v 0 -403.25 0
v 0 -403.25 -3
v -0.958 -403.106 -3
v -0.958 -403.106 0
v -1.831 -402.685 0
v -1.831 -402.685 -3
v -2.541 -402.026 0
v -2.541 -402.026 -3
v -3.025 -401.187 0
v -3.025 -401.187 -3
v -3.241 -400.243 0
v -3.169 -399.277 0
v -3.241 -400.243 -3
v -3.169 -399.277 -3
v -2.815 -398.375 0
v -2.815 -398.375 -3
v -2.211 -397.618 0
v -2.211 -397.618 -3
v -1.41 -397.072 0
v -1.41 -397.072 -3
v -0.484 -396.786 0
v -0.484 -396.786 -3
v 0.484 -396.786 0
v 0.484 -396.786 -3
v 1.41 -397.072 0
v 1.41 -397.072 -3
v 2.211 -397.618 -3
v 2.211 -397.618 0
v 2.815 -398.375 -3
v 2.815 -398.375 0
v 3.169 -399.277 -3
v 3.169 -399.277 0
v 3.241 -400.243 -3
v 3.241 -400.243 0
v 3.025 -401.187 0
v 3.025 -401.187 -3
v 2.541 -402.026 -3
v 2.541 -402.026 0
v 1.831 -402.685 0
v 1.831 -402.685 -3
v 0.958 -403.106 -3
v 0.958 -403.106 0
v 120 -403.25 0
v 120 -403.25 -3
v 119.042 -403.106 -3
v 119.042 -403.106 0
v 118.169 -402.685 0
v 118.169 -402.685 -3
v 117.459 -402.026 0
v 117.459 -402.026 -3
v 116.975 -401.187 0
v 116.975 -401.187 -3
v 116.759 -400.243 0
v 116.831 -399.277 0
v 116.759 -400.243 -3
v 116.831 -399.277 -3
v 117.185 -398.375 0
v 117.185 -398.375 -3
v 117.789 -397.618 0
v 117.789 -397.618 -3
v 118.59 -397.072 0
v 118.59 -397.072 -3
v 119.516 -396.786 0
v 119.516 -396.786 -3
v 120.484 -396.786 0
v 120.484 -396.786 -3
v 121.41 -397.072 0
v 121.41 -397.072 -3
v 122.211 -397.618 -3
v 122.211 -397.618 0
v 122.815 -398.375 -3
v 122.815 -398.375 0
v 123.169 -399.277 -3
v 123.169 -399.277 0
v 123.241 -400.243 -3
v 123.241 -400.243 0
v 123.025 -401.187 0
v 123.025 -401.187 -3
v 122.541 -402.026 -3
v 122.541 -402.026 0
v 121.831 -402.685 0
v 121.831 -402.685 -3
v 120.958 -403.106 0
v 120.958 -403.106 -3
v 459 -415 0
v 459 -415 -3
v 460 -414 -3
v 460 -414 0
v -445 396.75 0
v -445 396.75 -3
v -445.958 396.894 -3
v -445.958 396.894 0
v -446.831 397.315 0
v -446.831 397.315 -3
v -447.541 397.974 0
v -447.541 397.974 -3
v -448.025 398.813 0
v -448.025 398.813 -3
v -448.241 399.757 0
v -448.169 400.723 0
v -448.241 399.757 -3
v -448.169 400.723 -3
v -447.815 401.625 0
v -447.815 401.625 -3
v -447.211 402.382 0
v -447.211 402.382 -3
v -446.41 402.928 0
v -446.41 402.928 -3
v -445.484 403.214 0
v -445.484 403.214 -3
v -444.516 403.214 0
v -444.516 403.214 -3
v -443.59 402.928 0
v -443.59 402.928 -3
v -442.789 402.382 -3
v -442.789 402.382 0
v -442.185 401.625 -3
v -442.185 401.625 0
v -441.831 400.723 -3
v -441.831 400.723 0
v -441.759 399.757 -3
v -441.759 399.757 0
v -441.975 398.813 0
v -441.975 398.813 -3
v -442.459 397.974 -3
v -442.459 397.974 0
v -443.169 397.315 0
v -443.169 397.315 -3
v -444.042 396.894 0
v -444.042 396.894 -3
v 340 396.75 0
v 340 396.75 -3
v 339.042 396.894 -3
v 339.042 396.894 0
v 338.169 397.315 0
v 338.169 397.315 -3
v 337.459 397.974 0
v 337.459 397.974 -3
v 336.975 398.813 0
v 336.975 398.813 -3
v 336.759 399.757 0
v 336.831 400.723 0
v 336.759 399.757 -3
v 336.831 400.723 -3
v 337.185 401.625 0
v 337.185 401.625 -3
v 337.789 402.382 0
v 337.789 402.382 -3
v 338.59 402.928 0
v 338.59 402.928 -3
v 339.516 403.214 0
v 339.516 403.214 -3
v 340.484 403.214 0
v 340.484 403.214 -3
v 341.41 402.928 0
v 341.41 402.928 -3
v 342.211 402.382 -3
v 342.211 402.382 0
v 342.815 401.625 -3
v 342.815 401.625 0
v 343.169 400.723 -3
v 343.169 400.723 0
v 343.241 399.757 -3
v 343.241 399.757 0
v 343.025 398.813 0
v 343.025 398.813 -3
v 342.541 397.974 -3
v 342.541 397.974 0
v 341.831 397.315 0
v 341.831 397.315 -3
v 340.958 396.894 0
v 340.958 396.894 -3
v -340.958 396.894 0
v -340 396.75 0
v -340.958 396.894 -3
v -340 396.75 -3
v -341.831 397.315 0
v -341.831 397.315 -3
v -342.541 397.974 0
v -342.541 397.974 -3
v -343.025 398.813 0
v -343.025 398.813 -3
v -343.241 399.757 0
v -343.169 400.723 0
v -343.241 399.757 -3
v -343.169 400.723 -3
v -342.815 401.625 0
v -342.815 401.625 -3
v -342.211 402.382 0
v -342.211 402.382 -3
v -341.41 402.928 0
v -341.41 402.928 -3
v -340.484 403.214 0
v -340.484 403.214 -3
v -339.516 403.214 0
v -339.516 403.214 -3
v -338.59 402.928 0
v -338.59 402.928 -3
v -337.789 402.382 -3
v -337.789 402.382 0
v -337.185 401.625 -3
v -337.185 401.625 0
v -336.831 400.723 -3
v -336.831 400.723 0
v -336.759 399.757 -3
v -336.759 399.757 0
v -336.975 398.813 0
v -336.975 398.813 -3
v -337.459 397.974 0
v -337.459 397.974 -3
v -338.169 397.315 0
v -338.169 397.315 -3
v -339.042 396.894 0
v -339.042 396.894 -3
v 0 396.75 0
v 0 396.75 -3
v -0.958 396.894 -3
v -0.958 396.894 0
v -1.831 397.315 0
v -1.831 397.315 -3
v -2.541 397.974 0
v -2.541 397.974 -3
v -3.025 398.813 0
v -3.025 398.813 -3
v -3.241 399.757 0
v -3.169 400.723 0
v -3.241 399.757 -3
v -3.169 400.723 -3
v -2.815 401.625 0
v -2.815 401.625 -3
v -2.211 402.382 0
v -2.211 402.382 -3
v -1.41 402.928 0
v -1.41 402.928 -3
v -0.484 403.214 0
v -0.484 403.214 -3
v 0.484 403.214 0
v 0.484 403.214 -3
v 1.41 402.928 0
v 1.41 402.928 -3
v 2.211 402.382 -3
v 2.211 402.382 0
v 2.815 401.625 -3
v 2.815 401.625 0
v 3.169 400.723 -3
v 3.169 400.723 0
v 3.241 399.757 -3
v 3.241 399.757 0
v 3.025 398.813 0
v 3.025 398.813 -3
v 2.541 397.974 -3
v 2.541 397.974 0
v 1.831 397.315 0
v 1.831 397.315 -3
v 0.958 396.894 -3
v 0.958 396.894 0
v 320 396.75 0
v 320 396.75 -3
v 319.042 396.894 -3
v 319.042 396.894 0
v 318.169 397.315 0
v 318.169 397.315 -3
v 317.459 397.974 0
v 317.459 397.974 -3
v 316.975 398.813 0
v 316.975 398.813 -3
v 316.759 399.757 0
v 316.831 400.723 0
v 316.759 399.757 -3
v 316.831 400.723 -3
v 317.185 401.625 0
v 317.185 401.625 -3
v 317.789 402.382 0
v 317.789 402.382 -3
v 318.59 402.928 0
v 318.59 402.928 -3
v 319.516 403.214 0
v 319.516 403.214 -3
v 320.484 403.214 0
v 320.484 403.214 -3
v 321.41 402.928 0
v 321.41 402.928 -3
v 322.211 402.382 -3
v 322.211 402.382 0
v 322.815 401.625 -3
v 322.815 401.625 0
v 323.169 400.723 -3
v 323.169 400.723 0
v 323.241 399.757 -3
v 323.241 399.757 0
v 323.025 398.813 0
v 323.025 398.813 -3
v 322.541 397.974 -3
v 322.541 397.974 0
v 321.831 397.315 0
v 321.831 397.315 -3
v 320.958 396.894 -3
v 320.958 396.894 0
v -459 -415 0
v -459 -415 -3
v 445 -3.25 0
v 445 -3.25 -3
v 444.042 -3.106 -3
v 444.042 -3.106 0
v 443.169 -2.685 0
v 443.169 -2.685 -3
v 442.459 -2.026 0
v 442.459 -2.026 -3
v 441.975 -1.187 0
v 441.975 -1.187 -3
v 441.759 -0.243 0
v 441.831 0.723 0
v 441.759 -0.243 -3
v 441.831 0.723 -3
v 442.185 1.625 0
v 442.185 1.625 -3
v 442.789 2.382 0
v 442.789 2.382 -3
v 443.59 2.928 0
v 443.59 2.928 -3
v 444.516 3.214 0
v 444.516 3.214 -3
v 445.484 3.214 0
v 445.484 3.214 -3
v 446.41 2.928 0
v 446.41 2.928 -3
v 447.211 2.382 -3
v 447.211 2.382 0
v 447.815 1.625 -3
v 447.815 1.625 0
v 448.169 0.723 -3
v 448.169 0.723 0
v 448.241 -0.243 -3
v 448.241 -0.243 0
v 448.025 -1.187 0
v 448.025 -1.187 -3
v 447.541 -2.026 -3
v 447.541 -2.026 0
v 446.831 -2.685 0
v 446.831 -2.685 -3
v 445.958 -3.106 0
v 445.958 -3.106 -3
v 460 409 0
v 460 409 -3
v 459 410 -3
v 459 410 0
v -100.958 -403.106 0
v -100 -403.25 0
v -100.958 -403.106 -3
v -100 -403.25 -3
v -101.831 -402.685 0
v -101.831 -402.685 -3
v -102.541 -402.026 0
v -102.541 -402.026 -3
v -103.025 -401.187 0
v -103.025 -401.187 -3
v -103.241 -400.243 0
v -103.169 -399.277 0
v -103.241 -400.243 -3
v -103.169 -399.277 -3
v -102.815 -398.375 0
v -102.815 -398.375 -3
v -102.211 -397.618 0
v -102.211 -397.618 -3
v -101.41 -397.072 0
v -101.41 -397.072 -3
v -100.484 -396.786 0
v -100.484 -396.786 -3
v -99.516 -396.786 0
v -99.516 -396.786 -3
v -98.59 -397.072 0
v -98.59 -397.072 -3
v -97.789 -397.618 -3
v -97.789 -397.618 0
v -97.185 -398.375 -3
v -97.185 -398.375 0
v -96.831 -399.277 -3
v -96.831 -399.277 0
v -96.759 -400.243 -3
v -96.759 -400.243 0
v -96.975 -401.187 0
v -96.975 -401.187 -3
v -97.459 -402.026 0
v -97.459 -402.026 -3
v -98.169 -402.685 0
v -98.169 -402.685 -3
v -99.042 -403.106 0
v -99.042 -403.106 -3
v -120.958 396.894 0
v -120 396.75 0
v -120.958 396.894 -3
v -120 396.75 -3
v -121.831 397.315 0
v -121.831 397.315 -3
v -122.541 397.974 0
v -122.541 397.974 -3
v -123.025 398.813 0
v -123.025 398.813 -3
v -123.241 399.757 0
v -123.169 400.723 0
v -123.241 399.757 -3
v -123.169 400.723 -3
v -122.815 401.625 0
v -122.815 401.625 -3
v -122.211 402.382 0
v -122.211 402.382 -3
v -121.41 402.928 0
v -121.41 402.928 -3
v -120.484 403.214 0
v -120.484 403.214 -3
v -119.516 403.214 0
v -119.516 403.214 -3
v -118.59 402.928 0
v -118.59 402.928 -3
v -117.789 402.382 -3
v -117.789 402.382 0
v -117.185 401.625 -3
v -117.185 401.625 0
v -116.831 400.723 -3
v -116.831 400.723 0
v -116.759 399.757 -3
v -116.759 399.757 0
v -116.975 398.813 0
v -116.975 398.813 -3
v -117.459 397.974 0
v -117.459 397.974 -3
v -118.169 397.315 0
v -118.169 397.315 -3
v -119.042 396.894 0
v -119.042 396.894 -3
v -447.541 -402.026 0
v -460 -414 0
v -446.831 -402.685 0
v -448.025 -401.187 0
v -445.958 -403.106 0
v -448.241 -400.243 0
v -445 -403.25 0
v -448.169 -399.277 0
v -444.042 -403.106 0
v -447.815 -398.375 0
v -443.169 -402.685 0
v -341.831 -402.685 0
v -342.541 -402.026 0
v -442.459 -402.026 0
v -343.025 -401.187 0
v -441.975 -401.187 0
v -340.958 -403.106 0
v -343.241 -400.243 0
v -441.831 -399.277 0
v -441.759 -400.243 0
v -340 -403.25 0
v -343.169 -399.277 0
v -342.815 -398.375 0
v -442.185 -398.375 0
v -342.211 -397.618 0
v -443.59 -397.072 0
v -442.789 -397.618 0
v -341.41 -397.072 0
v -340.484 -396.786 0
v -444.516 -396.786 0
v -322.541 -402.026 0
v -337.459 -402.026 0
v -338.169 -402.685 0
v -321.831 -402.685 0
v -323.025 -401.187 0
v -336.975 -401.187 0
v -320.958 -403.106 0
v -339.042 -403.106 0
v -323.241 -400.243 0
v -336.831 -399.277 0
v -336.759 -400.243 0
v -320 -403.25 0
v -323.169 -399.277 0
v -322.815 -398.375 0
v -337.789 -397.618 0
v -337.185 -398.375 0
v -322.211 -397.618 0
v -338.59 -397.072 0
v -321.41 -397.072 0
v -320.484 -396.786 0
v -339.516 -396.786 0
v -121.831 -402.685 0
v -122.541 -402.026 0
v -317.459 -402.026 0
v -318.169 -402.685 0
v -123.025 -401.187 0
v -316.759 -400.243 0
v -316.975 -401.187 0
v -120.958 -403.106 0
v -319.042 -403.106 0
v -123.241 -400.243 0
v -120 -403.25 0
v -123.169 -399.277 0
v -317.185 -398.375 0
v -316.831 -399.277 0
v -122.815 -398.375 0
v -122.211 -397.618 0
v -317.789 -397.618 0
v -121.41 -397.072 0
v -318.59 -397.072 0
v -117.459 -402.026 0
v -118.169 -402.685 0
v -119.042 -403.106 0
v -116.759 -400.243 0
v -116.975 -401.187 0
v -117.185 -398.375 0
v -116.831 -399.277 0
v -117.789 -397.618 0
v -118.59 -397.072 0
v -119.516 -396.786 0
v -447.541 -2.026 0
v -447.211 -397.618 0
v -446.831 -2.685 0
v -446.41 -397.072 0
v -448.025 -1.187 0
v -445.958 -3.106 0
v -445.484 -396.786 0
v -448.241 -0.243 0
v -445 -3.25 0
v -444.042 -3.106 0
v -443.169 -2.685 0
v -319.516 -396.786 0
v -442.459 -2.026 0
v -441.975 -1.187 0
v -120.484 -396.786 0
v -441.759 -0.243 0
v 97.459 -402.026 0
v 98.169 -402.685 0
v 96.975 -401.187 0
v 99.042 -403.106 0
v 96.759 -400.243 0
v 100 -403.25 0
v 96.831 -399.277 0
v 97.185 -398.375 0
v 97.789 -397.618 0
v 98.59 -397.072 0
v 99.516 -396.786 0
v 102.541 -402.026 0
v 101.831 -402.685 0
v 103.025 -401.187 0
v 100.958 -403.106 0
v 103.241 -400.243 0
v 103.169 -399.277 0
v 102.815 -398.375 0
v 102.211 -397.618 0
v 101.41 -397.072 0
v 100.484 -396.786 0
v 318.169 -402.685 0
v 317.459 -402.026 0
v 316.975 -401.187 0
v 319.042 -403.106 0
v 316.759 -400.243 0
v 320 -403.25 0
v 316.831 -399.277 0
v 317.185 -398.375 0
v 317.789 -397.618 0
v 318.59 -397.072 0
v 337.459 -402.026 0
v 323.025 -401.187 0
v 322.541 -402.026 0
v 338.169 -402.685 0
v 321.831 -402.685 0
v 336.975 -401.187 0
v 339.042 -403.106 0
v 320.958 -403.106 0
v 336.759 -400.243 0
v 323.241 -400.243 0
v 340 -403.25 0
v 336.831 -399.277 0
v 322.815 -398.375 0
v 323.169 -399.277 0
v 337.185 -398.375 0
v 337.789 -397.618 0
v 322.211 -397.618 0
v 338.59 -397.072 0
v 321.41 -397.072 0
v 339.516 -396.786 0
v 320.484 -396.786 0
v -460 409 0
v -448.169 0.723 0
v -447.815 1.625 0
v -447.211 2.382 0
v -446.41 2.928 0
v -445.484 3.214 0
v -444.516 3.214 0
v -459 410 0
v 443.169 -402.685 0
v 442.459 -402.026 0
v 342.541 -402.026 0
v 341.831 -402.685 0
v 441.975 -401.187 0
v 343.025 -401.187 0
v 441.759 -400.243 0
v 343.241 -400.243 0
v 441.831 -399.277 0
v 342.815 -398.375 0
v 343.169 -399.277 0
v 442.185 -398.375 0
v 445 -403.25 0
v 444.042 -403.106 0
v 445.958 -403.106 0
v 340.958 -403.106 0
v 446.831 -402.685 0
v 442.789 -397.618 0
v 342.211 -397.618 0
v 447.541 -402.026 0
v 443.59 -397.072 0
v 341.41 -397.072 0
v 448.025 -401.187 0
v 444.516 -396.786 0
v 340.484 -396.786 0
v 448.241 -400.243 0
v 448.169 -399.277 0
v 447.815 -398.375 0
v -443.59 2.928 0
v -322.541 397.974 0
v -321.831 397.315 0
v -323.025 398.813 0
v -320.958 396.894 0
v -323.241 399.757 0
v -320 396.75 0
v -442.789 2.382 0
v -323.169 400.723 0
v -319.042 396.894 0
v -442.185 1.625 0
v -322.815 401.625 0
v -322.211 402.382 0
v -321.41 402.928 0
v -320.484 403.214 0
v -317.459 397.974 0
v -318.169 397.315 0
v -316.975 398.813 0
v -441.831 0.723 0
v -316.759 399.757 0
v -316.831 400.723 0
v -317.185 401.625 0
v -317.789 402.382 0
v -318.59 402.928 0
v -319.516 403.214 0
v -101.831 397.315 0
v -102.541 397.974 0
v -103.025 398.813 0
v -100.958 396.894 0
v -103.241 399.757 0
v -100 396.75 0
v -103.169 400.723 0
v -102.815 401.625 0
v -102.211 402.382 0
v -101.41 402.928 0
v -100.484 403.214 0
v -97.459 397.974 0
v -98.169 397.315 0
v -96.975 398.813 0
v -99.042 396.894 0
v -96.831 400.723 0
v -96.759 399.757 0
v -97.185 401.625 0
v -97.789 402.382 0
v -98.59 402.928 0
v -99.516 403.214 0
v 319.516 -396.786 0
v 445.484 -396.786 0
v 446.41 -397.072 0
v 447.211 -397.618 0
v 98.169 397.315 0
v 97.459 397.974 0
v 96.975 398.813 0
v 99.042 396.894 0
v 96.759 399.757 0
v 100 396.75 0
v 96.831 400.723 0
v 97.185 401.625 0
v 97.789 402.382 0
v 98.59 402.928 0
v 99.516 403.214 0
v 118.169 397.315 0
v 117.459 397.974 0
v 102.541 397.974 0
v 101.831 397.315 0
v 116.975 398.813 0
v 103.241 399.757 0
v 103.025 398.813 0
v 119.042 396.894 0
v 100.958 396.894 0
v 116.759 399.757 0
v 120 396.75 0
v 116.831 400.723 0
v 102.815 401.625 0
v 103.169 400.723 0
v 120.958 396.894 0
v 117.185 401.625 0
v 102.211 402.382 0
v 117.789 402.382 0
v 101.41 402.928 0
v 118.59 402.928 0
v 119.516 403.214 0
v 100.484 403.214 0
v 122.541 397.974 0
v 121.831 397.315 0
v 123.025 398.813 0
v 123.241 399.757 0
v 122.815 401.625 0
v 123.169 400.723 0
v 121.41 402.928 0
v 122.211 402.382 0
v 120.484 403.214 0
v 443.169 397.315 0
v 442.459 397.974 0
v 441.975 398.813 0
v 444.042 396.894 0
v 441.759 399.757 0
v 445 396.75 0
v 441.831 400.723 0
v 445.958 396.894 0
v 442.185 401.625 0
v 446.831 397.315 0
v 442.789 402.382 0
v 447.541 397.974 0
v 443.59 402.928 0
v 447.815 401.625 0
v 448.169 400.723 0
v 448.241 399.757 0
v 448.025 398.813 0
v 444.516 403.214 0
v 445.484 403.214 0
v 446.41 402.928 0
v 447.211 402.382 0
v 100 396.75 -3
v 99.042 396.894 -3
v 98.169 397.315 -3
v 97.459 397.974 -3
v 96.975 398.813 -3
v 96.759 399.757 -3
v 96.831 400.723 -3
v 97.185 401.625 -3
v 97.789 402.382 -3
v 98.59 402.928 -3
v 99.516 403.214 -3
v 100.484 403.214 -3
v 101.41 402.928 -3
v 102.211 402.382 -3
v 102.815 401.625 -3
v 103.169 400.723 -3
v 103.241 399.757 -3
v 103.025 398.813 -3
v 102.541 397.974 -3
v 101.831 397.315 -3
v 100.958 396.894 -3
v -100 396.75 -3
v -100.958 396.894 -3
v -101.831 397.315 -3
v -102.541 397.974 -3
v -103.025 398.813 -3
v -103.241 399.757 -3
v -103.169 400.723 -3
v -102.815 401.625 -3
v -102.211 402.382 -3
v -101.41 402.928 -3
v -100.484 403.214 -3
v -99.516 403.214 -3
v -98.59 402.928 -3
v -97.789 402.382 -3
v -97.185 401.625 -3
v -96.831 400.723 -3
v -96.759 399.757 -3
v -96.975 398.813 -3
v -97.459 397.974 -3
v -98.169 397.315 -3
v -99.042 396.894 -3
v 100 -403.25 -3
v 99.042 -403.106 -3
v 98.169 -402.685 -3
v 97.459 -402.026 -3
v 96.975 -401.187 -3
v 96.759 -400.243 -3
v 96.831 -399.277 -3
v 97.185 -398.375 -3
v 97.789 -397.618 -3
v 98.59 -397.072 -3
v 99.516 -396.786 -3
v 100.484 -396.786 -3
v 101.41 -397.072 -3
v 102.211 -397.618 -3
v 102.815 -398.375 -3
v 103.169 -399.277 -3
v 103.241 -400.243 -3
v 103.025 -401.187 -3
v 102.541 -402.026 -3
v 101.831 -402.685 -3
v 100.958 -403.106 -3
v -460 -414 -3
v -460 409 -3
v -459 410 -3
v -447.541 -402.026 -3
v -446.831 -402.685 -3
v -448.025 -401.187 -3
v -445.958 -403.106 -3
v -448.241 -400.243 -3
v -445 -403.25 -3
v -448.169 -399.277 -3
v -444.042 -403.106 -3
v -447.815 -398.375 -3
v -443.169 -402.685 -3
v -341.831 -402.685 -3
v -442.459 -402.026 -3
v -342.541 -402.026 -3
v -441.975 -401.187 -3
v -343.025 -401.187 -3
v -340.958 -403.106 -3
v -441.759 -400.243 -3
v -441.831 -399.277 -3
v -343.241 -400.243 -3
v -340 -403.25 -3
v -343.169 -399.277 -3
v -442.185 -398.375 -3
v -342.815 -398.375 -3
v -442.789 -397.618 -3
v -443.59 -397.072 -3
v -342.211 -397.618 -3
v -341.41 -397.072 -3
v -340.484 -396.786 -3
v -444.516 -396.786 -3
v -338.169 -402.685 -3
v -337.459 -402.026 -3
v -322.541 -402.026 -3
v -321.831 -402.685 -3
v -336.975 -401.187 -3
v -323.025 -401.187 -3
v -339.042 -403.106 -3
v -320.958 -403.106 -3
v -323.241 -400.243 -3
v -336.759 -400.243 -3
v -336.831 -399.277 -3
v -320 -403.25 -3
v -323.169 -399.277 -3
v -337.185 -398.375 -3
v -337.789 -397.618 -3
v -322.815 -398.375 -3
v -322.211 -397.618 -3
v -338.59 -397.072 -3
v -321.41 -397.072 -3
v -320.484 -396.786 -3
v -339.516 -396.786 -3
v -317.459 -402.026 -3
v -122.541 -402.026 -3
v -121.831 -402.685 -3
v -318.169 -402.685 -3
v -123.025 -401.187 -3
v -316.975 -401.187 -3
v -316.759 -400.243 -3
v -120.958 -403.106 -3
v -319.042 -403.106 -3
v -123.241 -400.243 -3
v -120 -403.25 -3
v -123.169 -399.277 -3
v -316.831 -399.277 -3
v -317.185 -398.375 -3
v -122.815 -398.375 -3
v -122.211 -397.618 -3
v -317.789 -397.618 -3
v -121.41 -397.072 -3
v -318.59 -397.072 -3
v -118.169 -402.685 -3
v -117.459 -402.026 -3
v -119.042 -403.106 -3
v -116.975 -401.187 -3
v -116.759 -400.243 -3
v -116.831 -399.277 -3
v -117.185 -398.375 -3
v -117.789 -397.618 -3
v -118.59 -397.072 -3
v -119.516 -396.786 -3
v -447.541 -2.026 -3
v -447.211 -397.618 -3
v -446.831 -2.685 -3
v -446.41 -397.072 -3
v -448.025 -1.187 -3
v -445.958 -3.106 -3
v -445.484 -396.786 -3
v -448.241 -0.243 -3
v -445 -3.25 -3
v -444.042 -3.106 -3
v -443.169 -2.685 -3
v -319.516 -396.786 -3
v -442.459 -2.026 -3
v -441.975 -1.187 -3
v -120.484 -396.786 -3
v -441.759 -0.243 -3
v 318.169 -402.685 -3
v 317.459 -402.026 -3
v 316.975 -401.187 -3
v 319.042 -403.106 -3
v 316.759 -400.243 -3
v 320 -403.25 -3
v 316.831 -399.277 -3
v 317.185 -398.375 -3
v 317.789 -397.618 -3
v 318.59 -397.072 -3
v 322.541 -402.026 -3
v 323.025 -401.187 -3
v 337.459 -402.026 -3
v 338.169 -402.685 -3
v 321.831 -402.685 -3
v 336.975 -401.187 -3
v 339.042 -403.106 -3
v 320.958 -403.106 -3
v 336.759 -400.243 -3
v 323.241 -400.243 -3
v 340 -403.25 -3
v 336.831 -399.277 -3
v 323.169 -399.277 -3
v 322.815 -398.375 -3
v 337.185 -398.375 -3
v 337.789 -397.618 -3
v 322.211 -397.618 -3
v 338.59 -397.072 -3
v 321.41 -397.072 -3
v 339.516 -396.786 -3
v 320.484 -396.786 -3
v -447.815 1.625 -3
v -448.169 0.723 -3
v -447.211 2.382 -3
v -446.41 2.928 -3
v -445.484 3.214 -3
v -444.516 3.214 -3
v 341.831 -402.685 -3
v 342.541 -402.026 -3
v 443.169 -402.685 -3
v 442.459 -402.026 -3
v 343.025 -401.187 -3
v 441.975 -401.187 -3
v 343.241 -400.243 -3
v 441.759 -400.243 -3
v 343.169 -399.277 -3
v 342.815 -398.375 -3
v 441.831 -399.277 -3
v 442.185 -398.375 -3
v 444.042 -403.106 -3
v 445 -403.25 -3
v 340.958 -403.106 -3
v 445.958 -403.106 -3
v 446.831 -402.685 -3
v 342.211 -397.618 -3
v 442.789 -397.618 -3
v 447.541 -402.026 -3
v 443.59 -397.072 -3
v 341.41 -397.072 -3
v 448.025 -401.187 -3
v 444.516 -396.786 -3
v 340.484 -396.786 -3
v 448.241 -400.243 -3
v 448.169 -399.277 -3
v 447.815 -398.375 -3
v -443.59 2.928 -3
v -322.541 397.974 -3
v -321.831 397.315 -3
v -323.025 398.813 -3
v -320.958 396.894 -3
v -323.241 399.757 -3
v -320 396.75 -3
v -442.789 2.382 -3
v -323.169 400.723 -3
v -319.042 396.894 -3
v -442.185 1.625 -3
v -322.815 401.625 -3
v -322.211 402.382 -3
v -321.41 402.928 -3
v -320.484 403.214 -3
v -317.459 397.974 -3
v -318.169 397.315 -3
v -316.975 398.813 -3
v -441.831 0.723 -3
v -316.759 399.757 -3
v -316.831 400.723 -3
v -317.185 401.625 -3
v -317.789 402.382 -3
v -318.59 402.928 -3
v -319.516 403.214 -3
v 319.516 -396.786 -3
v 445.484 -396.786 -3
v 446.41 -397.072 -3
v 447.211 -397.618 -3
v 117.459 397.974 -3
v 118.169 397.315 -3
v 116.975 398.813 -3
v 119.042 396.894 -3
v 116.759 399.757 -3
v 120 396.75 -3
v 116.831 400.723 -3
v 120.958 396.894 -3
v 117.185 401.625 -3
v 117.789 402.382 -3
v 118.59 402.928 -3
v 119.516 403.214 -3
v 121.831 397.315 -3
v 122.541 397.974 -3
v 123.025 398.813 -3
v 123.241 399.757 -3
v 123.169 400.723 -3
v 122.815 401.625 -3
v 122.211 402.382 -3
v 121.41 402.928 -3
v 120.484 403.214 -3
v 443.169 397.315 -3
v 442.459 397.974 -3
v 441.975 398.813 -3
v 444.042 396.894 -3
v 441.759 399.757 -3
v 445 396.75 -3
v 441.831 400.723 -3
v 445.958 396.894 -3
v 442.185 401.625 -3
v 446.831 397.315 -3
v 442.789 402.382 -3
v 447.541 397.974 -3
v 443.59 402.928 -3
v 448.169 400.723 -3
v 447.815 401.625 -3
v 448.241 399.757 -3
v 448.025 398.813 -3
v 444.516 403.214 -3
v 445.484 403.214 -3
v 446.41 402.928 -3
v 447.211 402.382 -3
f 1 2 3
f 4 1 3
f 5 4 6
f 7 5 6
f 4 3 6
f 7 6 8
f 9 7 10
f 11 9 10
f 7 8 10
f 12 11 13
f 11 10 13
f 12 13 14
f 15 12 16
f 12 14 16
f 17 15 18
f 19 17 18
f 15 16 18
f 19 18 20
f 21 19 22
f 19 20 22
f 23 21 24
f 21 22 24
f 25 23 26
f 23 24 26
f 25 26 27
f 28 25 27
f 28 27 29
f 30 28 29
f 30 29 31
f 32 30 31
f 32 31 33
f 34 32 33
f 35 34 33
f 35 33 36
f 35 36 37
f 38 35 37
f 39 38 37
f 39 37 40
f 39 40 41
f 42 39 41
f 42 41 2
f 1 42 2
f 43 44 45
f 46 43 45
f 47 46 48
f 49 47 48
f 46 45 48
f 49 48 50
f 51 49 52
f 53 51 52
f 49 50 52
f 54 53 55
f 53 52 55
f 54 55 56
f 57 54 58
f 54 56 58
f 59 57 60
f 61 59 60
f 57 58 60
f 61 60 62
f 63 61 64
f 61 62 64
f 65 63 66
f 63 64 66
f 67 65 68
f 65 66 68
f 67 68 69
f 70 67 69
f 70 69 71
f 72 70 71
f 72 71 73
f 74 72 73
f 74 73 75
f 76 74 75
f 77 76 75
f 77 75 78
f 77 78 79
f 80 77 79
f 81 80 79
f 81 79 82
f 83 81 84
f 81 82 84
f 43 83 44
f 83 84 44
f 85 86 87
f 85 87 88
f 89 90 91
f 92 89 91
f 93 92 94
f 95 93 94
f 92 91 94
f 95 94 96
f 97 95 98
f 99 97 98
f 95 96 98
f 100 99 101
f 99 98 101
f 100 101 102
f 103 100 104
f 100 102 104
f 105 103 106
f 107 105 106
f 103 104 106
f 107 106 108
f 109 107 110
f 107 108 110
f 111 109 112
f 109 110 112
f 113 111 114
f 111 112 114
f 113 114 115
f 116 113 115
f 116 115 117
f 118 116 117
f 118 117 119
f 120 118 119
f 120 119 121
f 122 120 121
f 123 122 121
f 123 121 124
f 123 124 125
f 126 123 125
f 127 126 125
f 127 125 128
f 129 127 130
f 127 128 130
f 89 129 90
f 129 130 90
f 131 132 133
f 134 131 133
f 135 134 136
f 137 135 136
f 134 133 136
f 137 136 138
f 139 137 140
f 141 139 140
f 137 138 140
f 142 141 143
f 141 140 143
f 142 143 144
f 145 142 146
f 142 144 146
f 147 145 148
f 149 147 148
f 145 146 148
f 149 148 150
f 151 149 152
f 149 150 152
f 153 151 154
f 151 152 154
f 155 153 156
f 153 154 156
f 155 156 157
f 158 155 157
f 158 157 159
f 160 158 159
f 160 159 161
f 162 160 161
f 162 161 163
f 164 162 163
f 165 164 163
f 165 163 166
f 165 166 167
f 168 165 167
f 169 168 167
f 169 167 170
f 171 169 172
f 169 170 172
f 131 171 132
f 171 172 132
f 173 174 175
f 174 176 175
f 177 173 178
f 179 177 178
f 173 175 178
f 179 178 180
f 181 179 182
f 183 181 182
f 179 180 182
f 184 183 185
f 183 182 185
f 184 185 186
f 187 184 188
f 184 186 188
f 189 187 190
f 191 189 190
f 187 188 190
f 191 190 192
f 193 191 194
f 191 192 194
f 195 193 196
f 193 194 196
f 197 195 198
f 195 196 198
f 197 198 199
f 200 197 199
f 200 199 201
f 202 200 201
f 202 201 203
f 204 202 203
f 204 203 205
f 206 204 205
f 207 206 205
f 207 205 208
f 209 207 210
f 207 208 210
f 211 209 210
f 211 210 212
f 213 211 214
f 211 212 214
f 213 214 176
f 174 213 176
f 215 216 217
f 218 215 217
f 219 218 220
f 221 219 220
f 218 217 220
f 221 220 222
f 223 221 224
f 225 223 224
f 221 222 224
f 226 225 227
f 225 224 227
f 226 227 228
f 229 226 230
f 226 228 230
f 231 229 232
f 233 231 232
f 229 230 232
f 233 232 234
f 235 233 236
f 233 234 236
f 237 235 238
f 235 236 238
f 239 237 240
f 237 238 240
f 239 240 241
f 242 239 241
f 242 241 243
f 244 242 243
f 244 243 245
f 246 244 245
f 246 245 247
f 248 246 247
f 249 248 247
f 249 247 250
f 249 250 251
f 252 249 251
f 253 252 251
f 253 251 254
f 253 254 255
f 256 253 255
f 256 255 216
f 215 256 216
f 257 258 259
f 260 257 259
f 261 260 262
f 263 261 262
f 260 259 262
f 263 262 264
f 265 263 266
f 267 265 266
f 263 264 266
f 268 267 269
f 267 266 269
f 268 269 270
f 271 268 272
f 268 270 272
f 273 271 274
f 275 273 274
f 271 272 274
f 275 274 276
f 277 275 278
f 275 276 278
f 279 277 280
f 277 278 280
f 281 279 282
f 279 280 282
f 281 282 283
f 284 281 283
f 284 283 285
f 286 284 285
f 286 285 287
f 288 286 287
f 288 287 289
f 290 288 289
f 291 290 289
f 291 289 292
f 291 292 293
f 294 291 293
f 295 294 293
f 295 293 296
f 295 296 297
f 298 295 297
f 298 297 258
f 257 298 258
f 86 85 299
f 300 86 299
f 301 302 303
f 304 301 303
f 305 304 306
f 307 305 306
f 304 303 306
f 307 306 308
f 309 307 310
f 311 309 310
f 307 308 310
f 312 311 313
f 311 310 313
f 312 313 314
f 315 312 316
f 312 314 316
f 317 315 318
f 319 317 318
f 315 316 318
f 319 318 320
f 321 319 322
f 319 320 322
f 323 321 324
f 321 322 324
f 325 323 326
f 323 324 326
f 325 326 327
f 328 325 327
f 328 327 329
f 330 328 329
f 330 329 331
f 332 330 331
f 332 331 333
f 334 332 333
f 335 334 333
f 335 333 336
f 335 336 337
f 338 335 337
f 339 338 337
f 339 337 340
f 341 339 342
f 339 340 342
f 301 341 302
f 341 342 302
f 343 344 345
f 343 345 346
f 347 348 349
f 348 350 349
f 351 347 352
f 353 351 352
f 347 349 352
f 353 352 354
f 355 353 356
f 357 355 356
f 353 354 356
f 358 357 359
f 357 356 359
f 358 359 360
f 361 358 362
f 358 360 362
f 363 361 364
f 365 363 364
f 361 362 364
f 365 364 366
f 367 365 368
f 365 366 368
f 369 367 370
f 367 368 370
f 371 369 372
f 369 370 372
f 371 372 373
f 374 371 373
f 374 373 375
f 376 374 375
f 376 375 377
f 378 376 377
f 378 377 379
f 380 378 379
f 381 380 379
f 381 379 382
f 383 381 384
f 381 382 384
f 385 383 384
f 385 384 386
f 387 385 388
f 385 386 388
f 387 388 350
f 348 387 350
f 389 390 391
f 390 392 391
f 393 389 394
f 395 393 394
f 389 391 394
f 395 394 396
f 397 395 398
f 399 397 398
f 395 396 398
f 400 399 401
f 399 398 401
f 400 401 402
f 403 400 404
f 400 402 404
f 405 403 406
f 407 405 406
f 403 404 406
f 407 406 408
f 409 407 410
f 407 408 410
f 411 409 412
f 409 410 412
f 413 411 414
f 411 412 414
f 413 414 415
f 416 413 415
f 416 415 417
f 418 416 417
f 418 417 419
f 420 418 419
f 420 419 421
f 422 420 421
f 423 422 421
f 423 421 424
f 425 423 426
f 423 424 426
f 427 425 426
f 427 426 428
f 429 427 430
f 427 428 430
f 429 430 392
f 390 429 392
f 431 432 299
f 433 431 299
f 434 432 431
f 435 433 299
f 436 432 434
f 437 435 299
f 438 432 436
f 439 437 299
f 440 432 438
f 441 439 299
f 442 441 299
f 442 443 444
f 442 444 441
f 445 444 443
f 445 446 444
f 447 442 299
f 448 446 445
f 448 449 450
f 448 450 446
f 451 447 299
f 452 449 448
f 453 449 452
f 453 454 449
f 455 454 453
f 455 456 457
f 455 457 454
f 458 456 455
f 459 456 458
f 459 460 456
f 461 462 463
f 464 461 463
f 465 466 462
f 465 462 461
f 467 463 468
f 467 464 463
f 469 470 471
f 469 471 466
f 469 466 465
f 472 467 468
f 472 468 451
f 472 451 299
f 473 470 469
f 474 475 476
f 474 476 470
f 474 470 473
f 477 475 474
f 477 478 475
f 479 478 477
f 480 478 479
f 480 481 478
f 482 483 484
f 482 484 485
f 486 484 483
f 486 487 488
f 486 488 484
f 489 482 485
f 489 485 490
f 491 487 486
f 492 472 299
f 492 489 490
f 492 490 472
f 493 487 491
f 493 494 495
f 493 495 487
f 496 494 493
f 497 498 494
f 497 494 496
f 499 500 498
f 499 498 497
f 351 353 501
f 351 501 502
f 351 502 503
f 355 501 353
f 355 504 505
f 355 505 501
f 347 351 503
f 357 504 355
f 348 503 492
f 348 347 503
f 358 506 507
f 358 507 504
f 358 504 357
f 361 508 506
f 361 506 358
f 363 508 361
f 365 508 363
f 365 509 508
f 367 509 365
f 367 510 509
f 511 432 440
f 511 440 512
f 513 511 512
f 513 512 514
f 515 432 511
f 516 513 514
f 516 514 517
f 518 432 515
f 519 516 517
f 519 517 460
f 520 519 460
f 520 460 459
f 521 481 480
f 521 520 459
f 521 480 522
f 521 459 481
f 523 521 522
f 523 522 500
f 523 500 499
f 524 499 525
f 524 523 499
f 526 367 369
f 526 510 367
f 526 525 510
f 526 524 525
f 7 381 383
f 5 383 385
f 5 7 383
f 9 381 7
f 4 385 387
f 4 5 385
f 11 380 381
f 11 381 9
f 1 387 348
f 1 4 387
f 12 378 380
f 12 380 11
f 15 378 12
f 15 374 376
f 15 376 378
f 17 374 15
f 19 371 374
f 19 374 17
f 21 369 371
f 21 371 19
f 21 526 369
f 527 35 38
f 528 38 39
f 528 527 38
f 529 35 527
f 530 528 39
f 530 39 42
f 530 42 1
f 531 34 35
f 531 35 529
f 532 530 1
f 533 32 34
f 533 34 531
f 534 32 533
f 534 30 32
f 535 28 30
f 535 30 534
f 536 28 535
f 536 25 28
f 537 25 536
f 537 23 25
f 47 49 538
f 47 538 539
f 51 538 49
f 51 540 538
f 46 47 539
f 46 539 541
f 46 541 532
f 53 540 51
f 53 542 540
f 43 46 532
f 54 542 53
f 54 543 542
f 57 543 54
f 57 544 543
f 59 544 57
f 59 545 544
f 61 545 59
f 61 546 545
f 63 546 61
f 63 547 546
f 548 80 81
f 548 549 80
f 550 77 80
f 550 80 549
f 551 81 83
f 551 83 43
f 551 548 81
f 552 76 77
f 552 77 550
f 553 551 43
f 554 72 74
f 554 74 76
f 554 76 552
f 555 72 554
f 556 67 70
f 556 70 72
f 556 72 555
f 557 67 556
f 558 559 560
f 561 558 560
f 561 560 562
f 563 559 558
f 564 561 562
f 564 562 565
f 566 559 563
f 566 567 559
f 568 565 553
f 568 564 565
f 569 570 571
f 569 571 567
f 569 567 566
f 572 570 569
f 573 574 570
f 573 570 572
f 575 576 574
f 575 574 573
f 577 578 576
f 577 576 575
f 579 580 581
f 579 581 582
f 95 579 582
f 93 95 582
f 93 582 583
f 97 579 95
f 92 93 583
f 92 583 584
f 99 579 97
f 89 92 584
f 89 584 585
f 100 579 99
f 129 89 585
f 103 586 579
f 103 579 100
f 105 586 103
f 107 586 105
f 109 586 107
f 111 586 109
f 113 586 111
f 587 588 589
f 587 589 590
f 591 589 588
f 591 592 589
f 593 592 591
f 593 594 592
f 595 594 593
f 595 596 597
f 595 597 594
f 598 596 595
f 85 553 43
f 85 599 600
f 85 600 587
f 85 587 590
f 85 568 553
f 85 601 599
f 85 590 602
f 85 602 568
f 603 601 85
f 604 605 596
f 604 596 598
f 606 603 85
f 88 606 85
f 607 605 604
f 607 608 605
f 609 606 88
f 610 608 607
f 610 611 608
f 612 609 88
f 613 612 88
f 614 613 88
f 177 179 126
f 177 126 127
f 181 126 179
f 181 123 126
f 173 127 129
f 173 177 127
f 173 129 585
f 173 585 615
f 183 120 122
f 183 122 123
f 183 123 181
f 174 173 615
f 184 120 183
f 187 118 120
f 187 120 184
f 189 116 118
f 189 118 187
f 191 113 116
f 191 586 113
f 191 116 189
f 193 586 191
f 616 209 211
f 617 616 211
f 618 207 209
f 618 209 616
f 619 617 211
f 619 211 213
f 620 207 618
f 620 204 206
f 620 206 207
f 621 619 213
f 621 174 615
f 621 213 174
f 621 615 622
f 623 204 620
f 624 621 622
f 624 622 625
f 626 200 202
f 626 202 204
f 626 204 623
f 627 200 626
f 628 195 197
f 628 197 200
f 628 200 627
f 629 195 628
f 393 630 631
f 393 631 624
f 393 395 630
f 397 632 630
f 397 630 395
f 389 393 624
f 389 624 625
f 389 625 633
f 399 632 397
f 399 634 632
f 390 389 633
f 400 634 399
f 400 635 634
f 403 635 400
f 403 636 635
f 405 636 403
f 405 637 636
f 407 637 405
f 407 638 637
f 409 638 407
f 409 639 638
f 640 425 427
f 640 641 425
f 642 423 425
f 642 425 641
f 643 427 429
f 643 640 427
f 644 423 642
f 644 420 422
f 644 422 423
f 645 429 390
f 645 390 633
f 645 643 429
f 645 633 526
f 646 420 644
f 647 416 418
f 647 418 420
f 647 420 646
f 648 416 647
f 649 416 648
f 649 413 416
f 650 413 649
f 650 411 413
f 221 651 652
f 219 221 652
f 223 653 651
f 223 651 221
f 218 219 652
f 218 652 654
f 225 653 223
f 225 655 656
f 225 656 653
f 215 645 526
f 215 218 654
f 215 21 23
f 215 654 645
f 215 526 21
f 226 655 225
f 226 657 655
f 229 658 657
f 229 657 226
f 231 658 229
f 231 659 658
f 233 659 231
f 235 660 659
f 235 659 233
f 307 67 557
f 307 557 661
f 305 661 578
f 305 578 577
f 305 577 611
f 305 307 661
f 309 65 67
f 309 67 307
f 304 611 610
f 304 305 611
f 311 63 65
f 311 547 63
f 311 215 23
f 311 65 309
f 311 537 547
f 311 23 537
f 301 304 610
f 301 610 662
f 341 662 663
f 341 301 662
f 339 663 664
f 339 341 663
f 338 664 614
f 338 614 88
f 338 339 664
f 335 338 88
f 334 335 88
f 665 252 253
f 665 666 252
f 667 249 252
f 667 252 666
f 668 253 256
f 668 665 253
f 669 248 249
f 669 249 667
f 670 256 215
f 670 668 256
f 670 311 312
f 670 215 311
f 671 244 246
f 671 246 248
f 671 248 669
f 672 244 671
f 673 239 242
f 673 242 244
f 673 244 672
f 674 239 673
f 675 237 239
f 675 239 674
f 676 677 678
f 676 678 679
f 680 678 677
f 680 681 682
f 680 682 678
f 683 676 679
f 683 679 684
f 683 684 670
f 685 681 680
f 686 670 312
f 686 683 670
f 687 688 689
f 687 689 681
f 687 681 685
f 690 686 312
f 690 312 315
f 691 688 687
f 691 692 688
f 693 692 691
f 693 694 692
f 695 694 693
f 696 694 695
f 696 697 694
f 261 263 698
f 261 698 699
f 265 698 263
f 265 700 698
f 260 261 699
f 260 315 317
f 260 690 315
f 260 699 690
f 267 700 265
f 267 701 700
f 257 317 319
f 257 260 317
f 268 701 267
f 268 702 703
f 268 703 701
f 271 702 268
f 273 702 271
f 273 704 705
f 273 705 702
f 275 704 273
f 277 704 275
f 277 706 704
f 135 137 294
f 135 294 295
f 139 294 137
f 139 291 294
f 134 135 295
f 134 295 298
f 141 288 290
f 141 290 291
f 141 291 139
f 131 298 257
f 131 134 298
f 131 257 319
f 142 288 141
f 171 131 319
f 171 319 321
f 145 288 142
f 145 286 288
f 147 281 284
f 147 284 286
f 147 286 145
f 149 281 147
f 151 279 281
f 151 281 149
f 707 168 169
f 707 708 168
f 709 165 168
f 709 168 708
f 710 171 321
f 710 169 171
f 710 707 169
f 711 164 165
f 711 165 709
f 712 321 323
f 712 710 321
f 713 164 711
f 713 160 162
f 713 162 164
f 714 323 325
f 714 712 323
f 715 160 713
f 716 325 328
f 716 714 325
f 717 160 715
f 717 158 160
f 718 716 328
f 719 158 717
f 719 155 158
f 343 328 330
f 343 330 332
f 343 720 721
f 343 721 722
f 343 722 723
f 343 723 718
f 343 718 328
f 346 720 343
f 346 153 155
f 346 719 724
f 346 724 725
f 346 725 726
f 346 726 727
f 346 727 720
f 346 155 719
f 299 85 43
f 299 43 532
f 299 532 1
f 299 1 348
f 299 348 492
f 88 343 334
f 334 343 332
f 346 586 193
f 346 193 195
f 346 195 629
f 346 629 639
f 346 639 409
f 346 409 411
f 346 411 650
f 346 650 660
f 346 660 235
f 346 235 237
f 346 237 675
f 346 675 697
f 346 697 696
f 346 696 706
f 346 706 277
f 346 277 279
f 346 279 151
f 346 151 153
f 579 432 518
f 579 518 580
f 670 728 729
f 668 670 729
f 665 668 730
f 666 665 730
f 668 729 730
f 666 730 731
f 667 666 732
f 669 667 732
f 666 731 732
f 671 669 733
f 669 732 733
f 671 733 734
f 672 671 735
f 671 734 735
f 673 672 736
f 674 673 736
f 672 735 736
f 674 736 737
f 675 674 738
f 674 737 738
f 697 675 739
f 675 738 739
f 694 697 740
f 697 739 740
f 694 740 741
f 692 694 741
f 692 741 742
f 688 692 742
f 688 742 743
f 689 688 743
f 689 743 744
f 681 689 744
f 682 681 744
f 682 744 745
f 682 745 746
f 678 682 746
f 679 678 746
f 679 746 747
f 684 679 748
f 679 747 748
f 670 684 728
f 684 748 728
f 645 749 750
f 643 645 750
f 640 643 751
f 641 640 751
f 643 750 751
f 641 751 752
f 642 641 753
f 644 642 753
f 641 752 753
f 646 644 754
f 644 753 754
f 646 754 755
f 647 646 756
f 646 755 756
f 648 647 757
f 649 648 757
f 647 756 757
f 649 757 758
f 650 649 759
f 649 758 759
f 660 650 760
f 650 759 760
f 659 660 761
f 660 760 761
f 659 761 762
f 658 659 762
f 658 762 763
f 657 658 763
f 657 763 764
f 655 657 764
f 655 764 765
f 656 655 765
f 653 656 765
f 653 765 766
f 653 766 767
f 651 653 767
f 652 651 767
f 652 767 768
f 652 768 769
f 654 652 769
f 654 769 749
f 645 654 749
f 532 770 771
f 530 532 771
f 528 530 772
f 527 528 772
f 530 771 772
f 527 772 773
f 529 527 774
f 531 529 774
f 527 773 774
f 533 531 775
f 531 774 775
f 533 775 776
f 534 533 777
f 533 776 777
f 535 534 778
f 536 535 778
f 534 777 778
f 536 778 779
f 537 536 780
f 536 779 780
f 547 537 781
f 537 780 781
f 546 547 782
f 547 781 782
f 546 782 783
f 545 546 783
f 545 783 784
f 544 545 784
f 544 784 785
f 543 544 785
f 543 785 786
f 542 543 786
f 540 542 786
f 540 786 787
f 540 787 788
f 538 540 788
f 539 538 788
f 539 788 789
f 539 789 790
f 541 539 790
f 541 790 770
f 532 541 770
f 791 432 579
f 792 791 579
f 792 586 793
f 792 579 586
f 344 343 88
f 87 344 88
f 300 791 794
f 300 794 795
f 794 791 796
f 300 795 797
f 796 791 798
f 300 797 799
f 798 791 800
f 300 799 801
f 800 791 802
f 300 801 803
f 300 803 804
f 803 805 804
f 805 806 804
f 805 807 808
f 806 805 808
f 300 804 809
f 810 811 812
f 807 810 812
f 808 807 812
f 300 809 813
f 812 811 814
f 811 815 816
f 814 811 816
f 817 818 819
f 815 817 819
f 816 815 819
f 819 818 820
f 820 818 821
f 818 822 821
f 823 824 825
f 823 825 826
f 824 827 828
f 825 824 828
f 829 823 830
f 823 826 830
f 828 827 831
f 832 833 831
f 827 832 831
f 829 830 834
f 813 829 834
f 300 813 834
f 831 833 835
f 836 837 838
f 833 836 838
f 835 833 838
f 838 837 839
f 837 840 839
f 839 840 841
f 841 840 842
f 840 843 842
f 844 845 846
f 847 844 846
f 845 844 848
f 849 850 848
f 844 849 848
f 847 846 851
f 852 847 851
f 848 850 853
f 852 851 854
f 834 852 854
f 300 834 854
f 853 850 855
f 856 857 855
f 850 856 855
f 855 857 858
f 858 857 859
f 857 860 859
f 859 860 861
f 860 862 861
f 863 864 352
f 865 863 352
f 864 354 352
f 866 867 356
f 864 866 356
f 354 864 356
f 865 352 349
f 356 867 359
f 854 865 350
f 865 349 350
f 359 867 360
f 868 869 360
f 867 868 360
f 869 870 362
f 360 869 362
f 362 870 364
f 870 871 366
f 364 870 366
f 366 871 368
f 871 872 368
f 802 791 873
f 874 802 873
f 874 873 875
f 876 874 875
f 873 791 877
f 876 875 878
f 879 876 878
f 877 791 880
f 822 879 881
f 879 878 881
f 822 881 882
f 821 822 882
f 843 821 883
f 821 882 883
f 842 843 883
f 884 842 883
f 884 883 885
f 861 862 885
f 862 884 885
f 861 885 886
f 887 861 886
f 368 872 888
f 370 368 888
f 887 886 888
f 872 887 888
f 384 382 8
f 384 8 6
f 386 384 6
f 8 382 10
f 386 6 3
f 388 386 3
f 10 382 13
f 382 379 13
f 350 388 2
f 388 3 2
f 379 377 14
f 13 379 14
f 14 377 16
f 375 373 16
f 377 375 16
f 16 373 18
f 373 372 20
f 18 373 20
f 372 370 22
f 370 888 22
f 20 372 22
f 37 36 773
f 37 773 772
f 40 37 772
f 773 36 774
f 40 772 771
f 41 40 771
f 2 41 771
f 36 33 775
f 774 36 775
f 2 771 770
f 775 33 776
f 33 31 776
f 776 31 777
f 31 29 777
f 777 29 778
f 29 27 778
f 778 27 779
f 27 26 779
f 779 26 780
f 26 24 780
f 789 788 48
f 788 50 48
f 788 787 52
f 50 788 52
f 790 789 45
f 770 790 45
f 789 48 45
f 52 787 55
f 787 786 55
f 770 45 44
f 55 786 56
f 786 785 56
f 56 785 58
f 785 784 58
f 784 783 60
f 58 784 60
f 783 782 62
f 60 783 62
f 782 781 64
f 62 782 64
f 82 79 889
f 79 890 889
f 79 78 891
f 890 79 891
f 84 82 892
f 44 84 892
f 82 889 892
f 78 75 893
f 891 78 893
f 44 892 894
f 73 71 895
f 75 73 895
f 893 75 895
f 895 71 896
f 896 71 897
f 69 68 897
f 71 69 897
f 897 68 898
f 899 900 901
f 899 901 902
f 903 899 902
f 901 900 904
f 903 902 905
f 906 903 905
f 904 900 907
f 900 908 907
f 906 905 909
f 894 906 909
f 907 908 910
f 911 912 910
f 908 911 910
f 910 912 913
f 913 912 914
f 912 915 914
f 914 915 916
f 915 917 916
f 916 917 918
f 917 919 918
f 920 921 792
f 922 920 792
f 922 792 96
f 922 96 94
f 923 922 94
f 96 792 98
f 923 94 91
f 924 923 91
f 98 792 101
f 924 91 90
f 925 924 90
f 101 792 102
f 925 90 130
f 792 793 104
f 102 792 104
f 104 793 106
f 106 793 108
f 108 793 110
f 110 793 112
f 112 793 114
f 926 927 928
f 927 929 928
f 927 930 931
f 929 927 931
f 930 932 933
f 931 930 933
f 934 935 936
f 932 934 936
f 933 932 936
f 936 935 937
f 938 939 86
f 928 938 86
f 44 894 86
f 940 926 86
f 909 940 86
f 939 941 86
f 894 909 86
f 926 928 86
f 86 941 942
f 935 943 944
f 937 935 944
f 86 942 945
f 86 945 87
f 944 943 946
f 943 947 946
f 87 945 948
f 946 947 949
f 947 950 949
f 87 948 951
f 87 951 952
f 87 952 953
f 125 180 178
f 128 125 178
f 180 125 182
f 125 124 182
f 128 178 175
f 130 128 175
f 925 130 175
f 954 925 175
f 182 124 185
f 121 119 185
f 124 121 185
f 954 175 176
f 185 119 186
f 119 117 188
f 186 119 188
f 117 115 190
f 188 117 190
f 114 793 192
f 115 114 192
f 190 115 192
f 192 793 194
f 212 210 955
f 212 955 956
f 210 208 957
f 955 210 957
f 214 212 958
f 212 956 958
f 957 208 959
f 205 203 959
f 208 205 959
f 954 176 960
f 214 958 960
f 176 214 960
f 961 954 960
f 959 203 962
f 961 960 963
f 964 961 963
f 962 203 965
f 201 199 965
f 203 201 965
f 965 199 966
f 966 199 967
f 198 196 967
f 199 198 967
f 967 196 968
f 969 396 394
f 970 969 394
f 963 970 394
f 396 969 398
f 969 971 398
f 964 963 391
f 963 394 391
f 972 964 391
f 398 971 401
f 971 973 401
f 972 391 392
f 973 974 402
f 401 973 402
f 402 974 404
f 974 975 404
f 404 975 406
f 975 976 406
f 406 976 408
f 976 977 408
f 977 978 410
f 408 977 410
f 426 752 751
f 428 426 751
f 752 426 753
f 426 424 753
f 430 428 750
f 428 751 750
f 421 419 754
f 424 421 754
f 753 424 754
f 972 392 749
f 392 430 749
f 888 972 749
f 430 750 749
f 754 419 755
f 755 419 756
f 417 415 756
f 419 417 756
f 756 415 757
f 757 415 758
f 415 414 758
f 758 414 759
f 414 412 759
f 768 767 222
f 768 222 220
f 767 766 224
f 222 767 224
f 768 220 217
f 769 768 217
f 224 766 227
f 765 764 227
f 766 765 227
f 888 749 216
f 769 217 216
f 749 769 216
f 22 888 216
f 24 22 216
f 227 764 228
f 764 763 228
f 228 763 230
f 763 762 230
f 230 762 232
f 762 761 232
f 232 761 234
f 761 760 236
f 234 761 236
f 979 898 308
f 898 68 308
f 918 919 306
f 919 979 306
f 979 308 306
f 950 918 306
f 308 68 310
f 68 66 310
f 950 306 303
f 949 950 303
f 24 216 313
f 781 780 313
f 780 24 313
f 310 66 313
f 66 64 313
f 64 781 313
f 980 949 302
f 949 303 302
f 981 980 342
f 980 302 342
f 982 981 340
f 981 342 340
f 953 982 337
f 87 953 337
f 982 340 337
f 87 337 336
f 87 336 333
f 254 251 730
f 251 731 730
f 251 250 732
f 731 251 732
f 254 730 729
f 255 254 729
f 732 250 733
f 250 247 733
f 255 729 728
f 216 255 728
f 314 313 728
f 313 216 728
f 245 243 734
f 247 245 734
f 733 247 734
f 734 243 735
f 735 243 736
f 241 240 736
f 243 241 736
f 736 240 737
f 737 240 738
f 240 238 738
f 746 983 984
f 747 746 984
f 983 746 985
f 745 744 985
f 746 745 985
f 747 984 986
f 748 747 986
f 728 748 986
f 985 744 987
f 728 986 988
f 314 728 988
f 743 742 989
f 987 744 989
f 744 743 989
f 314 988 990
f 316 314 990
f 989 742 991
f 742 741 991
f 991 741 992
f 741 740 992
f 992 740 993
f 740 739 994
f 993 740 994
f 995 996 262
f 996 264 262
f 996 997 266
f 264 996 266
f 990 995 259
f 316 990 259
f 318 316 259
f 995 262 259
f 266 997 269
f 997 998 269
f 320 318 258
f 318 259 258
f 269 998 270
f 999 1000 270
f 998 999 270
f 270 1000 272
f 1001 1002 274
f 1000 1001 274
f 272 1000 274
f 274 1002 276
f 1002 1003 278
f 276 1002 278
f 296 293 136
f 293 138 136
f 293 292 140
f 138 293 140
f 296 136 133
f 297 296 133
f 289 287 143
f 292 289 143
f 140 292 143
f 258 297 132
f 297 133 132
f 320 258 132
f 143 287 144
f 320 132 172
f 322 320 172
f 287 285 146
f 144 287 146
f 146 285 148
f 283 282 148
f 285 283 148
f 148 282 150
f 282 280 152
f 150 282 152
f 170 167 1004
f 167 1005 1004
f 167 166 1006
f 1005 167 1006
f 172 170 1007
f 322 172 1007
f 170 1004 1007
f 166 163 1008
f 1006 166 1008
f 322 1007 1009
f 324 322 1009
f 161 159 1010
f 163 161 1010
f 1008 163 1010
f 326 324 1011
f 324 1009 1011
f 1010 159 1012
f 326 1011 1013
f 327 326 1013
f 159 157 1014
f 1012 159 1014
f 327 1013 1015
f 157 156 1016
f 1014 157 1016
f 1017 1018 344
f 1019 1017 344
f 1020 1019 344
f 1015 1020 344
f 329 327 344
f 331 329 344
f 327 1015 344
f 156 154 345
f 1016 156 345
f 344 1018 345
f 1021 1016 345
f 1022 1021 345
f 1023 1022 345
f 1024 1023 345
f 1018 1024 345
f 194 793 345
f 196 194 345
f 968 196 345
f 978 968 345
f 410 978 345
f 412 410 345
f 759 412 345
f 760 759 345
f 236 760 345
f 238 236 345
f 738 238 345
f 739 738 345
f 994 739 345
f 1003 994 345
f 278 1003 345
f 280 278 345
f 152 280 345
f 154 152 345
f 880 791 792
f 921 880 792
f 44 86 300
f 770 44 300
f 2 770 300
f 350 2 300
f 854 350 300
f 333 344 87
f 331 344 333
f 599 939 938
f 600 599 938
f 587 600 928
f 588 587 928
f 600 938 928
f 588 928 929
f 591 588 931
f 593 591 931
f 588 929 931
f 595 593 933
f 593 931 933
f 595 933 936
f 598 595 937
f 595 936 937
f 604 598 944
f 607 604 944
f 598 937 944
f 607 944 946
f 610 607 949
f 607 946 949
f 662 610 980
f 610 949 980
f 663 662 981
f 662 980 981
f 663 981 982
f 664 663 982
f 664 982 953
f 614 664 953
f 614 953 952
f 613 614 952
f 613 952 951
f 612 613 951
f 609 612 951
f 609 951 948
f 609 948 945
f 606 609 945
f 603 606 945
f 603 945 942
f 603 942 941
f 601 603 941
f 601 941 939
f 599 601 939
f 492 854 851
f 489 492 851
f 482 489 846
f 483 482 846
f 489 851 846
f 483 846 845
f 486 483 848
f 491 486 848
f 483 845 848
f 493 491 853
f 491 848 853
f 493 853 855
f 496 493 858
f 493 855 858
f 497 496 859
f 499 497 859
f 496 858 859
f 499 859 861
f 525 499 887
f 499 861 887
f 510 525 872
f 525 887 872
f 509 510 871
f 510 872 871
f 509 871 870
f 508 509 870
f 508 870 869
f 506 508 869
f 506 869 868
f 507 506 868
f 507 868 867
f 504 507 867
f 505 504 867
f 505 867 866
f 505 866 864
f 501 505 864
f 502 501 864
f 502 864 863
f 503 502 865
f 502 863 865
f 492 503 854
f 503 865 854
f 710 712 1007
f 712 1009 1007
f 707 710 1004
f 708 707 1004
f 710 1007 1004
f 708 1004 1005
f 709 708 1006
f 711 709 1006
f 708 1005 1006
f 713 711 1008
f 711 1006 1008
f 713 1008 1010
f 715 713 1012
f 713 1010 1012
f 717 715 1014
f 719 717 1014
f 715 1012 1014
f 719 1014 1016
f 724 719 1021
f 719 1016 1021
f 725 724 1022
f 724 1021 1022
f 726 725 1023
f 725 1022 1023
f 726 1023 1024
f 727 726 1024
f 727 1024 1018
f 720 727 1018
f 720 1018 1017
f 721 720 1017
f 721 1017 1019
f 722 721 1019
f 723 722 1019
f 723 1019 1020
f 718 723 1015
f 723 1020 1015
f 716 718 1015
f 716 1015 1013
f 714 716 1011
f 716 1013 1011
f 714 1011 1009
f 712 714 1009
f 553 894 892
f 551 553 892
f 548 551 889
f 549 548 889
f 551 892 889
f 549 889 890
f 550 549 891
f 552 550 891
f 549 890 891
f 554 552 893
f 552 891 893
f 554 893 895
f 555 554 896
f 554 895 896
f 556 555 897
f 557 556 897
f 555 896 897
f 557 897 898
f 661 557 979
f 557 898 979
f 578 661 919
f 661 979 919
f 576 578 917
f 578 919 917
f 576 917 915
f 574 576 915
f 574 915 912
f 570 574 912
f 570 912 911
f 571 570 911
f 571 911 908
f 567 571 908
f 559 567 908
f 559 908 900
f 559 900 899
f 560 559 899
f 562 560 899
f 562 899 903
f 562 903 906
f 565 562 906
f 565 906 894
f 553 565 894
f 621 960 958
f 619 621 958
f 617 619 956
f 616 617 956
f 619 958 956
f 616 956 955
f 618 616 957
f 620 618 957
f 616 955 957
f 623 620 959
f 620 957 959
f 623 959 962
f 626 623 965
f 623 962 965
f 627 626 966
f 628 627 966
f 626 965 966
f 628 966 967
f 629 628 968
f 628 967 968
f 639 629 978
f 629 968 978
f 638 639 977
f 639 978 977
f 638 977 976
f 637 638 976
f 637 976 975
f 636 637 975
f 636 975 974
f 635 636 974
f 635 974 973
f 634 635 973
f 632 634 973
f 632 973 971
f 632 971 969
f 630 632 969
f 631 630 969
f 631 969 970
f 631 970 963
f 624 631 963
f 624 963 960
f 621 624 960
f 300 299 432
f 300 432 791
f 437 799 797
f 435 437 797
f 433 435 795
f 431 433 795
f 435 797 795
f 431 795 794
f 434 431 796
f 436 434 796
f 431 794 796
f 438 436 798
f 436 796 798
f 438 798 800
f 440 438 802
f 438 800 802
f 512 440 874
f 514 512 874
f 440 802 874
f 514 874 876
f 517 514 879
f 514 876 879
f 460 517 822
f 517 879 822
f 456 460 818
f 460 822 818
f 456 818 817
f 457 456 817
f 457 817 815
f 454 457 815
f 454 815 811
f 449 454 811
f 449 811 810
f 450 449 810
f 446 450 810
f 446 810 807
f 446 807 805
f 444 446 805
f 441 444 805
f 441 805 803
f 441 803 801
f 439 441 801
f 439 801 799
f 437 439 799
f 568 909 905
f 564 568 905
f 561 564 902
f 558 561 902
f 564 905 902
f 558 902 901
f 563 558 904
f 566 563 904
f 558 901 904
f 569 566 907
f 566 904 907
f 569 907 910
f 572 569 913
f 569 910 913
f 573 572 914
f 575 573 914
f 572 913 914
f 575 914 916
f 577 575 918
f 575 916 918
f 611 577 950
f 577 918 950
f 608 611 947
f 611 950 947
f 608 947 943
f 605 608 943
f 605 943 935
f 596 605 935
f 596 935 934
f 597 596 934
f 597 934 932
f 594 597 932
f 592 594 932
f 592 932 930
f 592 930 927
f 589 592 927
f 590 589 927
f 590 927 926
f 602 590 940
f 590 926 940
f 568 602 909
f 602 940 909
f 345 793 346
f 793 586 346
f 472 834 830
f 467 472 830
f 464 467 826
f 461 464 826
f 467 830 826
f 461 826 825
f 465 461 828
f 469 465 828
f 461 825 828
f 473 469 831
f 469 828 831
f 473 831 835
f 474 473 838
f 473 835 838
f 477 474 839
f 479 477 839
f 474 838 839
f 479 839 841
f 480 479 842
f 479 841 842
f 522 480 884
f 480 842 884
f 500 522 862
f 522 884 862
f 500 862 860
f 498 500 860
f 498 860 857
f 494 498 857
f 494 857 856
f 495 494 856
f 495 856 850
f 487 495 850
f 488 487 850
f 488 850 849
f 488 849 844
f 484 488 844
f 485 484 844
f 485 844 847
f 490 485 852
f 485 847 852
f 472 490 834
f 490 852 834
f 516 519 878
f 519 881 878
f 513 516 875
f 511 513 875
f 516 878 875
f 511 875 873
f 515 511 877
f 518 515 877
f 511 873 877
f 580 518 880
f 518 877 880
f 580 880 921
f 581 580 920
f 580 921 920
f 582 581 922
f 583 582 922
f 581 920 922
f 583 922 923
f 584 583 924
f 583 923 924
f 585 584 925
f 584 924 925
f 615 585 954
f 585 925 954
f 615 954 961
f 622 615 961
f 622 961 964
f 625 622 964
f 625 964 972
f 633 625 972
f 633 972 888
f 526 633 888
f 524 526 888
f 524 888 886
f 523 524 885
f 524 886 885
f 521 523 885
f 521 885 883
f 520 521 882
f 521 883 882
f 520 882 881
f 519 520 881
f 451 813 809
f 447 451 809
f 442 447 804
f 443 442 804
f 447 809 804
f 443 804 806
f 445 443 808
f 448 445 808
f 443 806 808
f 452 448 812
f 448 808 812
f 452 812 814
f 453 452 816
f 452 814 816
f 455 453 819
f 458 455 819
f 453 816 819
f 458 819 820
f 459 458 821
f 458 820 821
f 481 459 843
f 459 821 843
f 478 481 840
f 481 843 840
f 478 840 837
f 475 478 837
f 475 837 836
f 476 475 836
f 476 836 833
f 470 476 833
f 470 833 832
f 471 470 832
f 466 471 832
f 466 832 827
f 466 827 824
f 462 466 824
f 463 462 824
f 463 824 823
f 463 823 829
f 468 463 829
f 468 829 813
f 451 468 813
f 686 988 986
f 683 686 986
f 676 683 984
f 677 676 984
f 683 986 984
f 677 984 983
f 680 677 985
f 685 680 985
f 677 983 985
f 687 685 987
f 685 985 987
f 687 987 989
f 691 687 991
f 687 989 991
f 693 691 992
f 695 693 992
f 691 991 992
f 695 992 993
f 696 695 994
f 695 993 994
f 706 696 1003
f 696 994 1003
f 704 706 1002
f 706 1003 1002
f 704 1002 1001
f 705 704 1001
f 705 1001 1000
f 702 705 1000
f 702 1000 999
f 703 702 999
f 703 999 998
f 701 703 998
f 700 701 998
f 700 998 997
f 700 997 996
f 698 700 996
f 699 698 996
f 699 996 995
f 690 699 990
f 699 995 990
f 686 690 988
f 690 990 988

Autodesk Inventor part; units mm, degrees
ref_plane "YZ Plane" through (0, 0, 0) normal (1, 0, 0) x (0, 1, 0)
ref_plane "XZ Plane" through (0, 0, 0) normal (0, 1, 0) x (-1, 0, 0)
ref_plane "XY Plane" through (0, 0, 0) normal (0, 0, 1) x (1, 0, 0)
sketch "Esboço1" plane through (0, 0, 0) normal (0, 0, 1) x (1, 0, 0)
  line L0 (-644, 0) -> (644, 0) construction
  line L1 (0, -581) -> (0, 581) construction
  line L2 (-460, 415) -> (460, 415)
  line L3 (460, 415) -> (460, -415)
  line L4 (460, -415) -> (-460, -415)
  line L5 (-460, -415) -> (-460, 415)
  line L6 (-445, 415) -> (-445, -415) construction
  line L7 (445, 415) -> (445, -415) construction
  line L8 (-460, -400) -> (460, -400) construction
  line L9 (-460, 400) -> (460, 400) construction
  line L10 (-415, 415) -> (-415, -415) construction
  line L11 (415, 415) -> (415, -415) construction
  line L12 (330, -400) -> (330, 0) construction
  line L13 (220, -400) -> (220, 0) construction
  line L14 (110, -400) -> (110, 0) construction
  line L15 (-330, -400) -> (-330, 0) construction
  line L16 (-110, -400) -> (-110, 0) construction
  point P0 (0, 0)
  point P1 (-445, -400)
  point P2 (-445, 400)
  point P3 (-445, 0)
  point P4 (0, 400)
  point P5 (445, 400)
  point P6 (445, 0)
  point P7 (0, -400)
  point P8 (445, -400)
  point P9 (340, -400)
  point P10 (320, -400)
  point P11 (100, -400)
  point P12 (120, -400)
  point P13 (-340, -400)
  point P14 (-320, -400)
  point P15 (-220, -400)
  point P16 (-120, -400)
  point P17 (-100, -400)
  point P18 (340, 400)
  point P19 (320, 400)
  point P20 (120, 400)
  point P21 (100, 400)
  point P22 (-330, 400)
  point P23 (-100, 400)
  point P24 (-120, 400)
  point P25 (-320, 400)
  point P26 (-340, 400)
  dimension "d0" = 920
  dimension "d1" = 830
  dimension "d2" = 15
  dimension "d3" = 30
  dimension "d4" = 15
  dimension "d20" = 220
  dimension "d21" = 20
  dimension "d22" = 220
extrude "Extrusão1" add sketch "Esboço1" against normal blind 3
hole "Furo1" at (-445, -400, 0) at (-445, 400, 0) at (-445, 0, 0) at (0, 400, 0) at (445, 0, 0) at (445, 400, 0) at (0, -400, 0) at (445, -400, 0) direction (0, 0, -1) diameter 6.5 end through all clearance for "Countersunk Flat Head Hex Socket Screw ISO 10642" size "M6" standard "ISO"
hole "Furo2" at (340, -400, 0) at (320, -400, 0) at (120, -400, 0) at (100, -400, 0) at (-100, -400, 0) at (-120, -400, 0) at (-320, -400, 0) at (-340, -400, 0) at (-340, 400, 0) at (-320, 400, 0) at (-120, 400, 0) at (-100, 400, 0) at (100, 400, 0) at (120, 400, 0) at (320, 400, 0) at (340, 400, 0) direction (0, 0, -1) diameter 6.5 end through all clearance for "Countersunk Flat Head Hex Socket Screw ISO 10642" size "M6" standard "ISO"
chamfer "Chanfro1" distance 1 angle 45 4 edges at (-460, -415, -1.5) (-460, 415, -1.5) (460, 415, -1.5) (460, -415, -1.5)
move faces "Mover1" translate (0, -5, 0) faces at (153, 415, -1) (459.3333, 414.6667, -1) (-459.6667, 414.3333, -1)
equation "\"d22\" = d20"
properties part number "Chapa Base (Trilho Roletado)" material "ACM WT SN"
